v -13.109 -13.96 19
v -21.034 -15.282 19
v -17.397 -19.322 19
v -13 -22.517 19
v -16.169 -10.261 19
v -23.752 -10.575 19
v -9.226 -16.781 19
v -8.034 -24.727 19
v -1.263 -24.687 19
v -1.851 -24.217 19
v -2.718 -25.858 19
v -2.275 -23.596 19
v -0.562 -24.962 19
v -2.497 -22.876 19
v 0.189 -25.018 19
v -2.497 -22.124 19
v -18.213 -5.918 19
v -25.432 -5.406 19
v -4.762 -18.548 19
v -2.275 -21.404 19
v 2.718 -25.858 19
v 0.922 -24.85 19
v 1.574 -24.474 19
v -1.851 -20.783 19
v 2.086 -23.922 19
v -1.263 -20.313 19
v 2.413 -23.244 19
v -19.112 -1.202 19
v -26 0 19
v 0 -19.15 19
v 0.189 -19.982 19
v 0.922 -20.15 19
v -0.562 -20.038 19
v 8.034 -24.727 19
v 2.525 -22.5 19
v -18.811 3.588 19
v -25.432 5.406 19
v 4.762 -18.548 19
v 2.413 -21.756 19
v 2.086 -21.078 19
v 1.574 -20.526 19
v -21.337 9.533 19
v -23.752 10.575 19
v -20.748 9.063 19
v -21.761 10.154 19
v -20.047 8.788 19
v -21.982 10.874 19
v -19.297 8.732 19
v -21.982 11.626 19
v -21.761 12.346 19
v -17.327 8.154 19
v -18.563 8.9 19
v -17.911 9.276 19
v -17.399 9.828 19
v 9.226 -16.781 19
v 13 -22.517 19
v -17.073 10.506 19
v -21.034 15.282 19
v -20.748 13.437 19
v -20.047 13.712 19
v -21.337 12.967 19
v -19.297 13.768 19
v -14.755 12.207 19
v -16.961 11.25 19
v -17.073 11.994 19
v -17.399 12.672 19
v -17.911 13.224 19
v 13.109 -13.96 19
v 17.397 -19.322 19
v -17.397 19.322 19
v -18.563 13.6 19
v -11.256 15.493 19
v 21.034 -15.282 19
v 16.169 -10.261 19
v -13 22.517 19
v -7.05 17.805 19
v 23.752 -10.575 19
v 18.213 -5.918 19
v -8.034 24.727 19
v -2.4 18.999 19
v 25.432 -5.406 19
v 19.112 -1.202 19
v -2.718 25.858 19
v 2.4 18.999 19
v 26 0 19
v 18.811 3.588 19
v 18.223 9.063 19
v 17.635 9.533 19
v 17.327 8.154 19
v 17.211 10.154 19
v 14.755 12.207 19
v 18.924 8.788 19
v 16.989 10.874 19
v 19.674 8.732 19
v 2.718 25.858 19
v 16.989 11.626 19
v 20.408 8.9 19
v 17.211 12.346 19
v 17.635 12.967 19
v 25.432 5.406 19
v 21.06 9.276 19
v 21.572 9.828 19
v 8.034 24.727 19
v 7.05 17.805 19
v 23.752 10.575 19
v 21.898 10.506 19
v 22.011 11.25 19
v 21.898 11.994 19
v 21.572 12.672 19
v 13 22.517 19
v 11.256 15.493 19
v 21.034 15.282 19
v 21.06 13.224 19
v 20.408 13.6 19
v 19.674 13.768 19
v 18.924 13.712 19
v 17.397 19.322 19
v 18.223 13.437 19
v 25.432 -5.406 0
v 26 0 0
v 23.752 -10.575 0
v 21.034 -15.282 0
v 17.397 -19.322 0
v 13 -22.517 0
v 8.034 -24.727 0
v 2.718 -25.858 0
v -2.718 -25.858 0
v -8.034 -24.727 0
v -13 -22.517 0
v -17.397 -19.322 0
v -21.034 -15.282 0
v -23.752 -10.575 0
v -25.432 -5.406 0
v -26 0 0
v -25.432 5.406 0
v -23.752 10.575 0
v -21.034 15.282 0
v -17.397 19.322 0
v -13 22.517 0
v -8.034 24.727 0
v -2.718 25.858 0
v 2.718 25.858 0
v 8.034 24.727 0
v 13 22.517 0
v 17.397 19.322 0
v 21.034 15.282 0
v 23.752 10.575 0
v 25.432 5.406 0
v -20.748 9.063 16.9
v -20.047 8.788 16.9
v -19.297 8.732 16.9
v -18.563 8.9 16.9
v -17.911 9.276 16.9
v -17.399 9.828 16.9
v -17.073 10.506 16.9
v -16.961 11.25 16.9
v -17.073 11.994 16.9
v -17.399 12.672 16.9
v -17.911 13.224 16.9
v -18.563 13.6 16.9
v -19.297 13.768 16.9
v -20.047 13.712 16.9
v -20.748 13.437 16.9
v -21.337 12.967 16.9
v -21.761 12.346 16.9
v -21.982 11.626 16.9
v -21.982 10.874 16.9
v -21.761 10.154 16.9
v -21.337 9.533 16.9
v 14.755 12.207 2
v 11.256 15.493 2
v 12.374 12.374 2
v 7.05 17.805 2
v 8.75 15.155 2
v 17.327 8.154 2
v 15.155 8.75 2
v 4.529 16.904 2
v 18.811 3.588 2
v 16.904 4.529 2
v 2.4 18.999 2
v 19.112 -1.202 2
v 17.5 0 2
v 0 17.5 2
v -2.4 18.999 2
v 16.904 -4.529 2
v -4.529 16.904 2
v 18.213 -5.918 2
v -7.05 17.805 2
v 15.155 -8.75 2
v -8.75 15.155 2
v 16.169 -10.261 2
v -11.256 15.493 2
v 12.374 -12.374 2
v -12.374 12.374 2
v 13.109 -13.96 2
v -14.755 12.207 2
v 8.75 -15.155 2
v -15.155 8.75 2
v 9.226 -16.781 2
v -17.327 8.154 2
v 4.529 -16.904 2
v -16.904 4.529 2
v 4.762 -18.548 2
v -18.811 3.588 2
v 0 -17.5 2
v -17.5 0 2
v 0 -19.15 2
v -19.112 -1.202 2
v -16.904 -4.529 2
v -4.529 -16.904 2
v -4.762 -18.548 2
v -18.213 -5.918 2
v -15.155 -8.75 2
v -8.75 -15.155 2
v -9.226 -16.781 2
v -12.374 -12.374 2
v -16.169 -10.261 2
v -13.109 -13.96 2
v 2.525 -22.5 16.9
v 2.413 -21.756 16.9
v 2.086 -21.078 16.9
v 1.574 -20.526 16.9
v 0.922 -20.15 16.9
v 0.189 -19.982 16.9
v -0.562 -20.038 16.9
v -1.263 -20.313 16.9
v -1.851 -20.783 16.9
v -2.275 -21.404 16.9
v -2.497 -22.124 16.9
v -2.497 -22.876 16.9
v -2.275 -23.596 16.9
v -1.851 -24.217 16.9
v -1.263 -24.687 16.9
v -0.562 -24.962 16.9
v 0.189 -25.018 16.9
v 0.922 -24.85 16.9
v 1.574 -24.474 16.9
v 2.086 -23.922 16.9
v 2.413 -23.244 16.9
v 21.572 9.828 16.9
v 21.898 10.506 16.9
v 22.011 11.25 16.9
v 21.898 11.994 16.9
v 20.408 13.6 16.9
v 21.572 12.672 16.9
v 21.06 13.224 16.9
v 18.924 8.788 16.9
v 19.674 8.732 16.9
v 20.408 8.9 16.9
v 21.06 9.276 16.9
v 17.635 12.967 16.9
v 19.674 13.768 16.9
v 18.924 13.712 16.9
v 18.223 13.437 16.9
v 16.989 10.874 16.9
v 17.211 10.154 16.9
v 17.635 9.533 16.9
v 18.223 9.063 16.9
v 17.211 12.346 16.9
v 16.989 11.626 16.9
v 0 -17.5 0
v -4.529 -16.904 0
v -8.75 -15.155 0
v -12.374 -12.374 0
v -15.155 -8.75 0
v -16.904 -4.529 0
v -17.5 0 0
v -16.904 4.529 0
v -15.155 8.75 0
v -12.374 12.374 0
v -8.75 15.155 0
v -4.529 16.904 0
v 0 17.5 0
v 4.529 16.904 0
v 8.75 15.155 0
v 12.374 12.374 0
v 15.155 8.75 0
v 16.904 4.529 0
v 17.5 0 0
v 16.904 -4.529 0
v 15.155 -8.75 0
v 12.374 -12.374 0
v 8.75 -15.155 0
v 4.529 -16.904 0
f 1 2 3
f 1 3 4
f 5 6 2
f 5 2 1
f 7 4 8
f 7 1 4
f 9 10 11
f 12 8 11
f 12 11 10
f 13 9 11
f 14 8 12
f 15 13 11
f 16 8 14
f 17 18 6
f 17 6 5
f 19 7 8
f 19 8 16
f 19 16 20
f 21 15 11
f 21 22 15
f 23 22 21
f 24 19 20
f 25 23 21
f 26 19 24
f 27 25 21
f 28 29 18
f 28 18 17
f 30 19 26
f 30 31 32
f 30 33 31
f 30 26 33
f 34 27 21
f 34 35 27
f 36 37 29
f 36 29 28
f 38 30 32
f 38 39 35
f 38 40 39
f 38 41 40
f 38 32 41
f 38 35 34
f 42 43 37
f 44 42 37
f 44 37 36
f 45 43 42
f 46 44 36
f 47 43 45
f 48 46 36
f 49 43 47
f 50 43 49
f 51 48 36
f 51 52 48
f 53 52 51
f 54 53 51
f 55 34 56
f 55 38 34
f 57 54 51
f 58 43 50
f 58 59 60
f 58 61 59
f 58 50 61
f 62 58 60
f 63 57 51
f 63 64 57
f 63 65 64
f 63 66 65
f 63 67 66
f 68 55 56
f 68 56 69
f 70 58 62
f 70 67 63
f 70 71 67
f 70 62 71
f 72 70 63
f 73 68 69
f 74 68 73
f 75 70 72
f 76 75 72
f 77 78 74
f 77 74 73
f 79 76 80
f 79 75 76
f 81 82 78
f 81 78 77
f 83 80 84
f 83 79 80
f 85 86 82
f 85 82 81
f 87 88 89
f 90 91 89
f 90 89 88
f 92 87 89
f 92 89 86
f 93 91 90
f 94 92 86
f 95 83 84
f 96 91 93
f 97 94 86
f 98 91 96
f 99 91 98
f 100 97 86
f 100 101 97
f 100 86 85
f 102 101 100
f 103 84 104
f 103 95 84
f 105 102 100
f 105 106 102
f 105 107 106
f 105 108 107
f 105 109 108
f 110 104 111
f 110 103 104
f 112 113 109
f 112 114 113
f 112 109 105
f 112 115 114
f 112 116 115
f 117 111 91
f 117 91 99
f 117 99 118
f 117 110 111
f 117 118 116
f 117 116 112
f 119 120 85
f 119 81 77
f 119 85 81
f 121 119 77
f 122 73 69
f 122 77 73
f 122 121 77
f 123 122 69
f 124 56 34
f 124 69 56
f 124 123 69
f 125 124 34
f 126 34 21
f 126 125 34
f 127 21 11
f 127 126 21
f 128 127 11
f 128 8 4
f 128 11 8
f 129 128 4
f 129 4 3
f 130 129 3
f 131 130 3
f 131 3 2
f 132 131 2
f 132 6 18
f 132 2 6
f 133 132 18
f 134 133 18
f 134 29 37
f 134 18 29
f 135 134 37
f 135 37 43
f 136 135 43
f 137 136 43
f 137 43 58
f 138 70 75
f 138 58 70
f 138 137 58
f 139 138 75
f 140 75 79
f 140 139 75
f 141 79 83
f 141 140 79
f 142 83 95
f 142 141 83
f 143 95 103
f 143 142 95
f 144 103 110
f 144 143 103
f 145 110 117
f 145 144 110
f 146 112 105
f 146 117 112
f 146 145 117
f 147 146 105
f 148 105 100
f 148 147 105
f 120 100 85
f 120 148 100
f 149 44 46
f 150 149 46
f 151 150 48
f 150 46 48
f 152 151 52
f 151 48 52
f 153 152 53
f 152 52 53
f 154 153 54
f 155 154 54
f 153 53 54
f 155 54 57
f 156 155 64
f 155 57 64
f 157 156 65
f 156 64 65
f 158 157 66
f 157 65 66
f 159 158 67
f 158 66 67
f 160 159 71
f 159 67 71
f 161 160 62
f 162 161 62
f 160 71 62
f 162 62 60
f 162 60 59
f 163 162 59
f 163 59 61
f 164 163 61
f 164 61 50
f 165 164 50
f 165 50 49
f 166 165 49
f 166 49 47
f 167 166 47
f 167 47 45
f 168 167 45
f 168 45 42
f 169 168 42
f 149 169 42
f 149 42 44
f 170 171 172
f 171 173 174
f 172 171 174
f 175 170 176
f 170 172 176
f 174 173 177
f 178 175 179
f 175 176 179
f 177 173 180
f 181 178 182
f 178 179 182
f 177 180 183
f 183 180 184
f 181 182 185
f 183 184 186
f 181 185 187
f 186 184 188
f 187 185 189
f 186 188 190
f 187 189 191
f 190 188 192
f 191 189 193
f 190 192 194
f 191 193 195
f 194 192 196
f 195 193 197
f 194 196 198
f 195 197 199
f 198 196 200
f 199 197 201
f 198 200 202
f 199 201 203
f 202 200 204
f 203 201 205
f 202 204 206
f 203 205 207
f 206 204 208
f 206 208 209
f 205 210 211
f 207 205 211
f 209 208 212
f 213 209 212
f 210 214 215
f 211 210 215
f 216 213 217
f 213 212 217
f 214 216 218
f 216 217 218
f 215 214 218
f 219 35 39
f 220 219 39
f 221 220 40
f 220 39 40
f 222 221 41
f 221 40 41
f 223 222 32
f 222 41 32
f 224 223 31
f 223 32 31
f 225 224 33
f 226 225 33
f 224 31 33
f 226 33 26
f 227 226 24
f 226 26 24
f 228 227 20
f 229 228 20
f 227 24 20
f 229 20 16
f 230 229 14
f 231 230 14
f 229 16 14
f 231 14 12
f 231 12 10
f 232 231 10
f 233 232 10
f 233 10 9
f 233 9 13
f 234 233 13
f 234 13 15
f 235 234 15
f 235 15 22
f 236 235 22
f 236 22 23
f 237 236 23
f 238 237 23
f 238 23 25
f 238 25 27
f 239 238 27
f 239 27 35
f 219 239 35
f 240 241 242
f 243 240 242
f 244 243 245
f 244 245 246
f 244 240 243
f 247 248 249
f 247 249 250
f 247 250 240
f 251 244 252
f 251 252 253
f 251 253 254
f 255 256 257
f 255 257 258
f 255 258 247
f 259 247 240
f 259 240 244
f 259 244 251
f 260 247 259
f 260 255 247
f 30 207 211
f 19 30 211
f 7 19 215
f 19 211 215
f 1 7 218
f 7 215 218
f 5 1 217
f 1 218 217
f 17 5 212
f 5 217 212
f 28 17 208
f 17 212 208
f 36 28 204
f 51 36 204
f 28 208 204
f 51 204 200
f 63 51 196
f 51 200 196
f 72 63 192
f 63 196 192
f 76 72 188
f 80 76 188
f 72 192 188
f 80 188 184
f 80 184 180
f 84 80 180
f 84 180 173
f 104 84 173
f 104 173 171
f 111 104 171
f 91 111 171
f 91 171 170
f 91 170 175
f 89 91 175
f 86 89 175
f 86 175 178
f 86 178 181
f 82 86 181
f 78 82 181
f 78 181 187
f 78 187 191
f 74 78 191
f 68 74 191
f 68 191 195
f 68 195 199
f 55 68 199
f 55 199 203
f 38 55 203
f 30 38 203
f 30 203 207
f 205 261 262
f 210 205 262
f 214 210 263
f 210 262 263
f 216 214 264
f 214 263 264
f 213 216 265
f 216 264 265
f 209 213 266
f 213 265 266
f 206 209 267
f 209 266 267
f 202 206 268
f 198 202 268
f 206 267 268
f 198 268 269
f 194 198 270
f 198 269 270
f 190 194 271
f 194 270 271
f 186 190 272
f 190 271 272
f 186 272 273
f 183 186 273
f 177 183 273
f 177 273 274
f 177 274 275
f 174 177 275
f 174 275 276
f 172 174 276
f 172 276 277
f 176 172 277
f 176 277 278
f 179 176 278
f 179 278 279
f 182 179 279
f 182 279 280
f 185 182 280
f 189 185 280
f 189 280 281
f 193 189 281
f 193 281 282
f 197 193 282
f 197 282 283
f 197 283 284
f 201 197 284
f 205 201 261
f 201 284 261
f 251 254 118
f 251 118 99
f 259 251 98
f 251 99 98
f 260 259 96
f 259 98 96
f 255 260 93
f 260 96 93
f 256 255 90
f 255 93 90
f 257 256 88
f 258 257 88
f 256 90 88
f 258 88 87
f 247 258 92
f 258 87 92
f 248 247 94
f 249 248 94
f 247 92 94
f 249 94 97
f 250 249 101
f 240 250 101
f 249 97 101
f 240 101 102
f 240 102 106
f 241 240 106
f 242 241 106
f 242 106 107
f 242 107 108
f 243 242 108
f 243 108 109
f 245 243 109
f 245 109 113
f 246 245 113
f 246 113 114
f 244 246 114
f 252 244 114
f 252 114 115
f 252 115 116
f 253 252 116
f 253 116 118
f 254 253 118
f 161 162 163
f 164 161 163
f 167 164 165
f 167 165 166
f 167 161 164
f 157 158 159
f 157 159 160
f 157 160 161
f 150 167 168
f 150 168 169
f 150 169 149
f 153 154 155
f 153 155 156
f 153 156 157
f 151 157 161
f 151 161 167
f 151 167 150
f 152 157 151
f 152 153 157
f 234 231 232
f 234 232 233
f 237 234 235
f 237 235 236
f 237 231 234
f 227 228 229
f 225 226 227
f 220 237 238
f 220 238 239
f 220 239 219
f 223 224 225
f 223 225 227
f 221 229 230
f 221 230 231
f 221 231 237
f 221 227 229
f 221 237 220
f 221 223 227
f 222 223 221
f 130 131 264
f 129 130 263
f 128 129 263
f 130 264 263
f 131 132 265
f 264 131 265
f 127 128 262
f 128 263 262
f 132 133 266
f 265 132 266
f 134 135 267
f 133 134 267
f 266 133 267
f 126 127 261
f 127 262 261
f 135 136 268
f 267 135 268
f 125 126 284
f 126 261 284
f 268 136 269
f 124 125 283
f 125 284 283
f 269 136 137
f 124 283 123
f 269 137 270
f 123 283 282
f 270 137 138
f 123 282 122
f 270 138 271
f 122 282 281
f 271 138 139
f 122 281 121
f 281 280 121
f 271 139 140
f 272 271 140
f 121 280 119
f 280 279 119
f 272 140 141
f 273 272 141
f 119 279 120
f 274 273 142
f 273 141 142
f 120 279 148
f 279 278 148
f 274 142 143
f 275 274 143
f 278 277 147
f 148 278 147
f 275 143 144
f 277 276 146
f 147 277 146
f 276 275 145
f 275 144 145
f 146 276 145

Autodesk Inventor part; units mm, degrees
ref_plane "YZ Plane" through (0, 0, 0) normal (1, 0, 0) x (0, 1, 0)
ref_plane "XZ Plane" through (0, 0, 0) normal (0, 1, 0) x (-1, 0, 0)
ref_plane "XY Plane" through (0, 0, 0) normal (0, 0, 1) x (1, 0, 0)
sketch "Skizze1" plane through (0, 0, 0) normal (0, 0, 1) x (1, 0, 0)
  circle A0 centre (0, 0) radius 26
  dimension "d0" = 52
extrude "Extrusion1" add sketch "Skizze1" along normal blind 19
hole "Bohrung1" at (0, 0, 19) direction (0, 0, -1) diameter 35 depth 20 counterbore diameter 38.3 counterbore depth 17
sketch "Skizze2" plane through (0, 0, 19) normal (0, 0, 1) x (1, 0, 0)
  circle A0 centre (0, -22.5) radius 2.525
  point P0 (0, 0)
  dimension "d12" = 5.05
  dimension "d13" = 22.5
extrude "Extrusion2" cut sketch "Skizze2" against normal blind 2.1
pattern_circular "Runde Anordnung1" count 3 over 360 about axis through (0, 0, 0) along (0, 0, 1) of "Extrusion2"
properties part number "Sensor Deckel383"
